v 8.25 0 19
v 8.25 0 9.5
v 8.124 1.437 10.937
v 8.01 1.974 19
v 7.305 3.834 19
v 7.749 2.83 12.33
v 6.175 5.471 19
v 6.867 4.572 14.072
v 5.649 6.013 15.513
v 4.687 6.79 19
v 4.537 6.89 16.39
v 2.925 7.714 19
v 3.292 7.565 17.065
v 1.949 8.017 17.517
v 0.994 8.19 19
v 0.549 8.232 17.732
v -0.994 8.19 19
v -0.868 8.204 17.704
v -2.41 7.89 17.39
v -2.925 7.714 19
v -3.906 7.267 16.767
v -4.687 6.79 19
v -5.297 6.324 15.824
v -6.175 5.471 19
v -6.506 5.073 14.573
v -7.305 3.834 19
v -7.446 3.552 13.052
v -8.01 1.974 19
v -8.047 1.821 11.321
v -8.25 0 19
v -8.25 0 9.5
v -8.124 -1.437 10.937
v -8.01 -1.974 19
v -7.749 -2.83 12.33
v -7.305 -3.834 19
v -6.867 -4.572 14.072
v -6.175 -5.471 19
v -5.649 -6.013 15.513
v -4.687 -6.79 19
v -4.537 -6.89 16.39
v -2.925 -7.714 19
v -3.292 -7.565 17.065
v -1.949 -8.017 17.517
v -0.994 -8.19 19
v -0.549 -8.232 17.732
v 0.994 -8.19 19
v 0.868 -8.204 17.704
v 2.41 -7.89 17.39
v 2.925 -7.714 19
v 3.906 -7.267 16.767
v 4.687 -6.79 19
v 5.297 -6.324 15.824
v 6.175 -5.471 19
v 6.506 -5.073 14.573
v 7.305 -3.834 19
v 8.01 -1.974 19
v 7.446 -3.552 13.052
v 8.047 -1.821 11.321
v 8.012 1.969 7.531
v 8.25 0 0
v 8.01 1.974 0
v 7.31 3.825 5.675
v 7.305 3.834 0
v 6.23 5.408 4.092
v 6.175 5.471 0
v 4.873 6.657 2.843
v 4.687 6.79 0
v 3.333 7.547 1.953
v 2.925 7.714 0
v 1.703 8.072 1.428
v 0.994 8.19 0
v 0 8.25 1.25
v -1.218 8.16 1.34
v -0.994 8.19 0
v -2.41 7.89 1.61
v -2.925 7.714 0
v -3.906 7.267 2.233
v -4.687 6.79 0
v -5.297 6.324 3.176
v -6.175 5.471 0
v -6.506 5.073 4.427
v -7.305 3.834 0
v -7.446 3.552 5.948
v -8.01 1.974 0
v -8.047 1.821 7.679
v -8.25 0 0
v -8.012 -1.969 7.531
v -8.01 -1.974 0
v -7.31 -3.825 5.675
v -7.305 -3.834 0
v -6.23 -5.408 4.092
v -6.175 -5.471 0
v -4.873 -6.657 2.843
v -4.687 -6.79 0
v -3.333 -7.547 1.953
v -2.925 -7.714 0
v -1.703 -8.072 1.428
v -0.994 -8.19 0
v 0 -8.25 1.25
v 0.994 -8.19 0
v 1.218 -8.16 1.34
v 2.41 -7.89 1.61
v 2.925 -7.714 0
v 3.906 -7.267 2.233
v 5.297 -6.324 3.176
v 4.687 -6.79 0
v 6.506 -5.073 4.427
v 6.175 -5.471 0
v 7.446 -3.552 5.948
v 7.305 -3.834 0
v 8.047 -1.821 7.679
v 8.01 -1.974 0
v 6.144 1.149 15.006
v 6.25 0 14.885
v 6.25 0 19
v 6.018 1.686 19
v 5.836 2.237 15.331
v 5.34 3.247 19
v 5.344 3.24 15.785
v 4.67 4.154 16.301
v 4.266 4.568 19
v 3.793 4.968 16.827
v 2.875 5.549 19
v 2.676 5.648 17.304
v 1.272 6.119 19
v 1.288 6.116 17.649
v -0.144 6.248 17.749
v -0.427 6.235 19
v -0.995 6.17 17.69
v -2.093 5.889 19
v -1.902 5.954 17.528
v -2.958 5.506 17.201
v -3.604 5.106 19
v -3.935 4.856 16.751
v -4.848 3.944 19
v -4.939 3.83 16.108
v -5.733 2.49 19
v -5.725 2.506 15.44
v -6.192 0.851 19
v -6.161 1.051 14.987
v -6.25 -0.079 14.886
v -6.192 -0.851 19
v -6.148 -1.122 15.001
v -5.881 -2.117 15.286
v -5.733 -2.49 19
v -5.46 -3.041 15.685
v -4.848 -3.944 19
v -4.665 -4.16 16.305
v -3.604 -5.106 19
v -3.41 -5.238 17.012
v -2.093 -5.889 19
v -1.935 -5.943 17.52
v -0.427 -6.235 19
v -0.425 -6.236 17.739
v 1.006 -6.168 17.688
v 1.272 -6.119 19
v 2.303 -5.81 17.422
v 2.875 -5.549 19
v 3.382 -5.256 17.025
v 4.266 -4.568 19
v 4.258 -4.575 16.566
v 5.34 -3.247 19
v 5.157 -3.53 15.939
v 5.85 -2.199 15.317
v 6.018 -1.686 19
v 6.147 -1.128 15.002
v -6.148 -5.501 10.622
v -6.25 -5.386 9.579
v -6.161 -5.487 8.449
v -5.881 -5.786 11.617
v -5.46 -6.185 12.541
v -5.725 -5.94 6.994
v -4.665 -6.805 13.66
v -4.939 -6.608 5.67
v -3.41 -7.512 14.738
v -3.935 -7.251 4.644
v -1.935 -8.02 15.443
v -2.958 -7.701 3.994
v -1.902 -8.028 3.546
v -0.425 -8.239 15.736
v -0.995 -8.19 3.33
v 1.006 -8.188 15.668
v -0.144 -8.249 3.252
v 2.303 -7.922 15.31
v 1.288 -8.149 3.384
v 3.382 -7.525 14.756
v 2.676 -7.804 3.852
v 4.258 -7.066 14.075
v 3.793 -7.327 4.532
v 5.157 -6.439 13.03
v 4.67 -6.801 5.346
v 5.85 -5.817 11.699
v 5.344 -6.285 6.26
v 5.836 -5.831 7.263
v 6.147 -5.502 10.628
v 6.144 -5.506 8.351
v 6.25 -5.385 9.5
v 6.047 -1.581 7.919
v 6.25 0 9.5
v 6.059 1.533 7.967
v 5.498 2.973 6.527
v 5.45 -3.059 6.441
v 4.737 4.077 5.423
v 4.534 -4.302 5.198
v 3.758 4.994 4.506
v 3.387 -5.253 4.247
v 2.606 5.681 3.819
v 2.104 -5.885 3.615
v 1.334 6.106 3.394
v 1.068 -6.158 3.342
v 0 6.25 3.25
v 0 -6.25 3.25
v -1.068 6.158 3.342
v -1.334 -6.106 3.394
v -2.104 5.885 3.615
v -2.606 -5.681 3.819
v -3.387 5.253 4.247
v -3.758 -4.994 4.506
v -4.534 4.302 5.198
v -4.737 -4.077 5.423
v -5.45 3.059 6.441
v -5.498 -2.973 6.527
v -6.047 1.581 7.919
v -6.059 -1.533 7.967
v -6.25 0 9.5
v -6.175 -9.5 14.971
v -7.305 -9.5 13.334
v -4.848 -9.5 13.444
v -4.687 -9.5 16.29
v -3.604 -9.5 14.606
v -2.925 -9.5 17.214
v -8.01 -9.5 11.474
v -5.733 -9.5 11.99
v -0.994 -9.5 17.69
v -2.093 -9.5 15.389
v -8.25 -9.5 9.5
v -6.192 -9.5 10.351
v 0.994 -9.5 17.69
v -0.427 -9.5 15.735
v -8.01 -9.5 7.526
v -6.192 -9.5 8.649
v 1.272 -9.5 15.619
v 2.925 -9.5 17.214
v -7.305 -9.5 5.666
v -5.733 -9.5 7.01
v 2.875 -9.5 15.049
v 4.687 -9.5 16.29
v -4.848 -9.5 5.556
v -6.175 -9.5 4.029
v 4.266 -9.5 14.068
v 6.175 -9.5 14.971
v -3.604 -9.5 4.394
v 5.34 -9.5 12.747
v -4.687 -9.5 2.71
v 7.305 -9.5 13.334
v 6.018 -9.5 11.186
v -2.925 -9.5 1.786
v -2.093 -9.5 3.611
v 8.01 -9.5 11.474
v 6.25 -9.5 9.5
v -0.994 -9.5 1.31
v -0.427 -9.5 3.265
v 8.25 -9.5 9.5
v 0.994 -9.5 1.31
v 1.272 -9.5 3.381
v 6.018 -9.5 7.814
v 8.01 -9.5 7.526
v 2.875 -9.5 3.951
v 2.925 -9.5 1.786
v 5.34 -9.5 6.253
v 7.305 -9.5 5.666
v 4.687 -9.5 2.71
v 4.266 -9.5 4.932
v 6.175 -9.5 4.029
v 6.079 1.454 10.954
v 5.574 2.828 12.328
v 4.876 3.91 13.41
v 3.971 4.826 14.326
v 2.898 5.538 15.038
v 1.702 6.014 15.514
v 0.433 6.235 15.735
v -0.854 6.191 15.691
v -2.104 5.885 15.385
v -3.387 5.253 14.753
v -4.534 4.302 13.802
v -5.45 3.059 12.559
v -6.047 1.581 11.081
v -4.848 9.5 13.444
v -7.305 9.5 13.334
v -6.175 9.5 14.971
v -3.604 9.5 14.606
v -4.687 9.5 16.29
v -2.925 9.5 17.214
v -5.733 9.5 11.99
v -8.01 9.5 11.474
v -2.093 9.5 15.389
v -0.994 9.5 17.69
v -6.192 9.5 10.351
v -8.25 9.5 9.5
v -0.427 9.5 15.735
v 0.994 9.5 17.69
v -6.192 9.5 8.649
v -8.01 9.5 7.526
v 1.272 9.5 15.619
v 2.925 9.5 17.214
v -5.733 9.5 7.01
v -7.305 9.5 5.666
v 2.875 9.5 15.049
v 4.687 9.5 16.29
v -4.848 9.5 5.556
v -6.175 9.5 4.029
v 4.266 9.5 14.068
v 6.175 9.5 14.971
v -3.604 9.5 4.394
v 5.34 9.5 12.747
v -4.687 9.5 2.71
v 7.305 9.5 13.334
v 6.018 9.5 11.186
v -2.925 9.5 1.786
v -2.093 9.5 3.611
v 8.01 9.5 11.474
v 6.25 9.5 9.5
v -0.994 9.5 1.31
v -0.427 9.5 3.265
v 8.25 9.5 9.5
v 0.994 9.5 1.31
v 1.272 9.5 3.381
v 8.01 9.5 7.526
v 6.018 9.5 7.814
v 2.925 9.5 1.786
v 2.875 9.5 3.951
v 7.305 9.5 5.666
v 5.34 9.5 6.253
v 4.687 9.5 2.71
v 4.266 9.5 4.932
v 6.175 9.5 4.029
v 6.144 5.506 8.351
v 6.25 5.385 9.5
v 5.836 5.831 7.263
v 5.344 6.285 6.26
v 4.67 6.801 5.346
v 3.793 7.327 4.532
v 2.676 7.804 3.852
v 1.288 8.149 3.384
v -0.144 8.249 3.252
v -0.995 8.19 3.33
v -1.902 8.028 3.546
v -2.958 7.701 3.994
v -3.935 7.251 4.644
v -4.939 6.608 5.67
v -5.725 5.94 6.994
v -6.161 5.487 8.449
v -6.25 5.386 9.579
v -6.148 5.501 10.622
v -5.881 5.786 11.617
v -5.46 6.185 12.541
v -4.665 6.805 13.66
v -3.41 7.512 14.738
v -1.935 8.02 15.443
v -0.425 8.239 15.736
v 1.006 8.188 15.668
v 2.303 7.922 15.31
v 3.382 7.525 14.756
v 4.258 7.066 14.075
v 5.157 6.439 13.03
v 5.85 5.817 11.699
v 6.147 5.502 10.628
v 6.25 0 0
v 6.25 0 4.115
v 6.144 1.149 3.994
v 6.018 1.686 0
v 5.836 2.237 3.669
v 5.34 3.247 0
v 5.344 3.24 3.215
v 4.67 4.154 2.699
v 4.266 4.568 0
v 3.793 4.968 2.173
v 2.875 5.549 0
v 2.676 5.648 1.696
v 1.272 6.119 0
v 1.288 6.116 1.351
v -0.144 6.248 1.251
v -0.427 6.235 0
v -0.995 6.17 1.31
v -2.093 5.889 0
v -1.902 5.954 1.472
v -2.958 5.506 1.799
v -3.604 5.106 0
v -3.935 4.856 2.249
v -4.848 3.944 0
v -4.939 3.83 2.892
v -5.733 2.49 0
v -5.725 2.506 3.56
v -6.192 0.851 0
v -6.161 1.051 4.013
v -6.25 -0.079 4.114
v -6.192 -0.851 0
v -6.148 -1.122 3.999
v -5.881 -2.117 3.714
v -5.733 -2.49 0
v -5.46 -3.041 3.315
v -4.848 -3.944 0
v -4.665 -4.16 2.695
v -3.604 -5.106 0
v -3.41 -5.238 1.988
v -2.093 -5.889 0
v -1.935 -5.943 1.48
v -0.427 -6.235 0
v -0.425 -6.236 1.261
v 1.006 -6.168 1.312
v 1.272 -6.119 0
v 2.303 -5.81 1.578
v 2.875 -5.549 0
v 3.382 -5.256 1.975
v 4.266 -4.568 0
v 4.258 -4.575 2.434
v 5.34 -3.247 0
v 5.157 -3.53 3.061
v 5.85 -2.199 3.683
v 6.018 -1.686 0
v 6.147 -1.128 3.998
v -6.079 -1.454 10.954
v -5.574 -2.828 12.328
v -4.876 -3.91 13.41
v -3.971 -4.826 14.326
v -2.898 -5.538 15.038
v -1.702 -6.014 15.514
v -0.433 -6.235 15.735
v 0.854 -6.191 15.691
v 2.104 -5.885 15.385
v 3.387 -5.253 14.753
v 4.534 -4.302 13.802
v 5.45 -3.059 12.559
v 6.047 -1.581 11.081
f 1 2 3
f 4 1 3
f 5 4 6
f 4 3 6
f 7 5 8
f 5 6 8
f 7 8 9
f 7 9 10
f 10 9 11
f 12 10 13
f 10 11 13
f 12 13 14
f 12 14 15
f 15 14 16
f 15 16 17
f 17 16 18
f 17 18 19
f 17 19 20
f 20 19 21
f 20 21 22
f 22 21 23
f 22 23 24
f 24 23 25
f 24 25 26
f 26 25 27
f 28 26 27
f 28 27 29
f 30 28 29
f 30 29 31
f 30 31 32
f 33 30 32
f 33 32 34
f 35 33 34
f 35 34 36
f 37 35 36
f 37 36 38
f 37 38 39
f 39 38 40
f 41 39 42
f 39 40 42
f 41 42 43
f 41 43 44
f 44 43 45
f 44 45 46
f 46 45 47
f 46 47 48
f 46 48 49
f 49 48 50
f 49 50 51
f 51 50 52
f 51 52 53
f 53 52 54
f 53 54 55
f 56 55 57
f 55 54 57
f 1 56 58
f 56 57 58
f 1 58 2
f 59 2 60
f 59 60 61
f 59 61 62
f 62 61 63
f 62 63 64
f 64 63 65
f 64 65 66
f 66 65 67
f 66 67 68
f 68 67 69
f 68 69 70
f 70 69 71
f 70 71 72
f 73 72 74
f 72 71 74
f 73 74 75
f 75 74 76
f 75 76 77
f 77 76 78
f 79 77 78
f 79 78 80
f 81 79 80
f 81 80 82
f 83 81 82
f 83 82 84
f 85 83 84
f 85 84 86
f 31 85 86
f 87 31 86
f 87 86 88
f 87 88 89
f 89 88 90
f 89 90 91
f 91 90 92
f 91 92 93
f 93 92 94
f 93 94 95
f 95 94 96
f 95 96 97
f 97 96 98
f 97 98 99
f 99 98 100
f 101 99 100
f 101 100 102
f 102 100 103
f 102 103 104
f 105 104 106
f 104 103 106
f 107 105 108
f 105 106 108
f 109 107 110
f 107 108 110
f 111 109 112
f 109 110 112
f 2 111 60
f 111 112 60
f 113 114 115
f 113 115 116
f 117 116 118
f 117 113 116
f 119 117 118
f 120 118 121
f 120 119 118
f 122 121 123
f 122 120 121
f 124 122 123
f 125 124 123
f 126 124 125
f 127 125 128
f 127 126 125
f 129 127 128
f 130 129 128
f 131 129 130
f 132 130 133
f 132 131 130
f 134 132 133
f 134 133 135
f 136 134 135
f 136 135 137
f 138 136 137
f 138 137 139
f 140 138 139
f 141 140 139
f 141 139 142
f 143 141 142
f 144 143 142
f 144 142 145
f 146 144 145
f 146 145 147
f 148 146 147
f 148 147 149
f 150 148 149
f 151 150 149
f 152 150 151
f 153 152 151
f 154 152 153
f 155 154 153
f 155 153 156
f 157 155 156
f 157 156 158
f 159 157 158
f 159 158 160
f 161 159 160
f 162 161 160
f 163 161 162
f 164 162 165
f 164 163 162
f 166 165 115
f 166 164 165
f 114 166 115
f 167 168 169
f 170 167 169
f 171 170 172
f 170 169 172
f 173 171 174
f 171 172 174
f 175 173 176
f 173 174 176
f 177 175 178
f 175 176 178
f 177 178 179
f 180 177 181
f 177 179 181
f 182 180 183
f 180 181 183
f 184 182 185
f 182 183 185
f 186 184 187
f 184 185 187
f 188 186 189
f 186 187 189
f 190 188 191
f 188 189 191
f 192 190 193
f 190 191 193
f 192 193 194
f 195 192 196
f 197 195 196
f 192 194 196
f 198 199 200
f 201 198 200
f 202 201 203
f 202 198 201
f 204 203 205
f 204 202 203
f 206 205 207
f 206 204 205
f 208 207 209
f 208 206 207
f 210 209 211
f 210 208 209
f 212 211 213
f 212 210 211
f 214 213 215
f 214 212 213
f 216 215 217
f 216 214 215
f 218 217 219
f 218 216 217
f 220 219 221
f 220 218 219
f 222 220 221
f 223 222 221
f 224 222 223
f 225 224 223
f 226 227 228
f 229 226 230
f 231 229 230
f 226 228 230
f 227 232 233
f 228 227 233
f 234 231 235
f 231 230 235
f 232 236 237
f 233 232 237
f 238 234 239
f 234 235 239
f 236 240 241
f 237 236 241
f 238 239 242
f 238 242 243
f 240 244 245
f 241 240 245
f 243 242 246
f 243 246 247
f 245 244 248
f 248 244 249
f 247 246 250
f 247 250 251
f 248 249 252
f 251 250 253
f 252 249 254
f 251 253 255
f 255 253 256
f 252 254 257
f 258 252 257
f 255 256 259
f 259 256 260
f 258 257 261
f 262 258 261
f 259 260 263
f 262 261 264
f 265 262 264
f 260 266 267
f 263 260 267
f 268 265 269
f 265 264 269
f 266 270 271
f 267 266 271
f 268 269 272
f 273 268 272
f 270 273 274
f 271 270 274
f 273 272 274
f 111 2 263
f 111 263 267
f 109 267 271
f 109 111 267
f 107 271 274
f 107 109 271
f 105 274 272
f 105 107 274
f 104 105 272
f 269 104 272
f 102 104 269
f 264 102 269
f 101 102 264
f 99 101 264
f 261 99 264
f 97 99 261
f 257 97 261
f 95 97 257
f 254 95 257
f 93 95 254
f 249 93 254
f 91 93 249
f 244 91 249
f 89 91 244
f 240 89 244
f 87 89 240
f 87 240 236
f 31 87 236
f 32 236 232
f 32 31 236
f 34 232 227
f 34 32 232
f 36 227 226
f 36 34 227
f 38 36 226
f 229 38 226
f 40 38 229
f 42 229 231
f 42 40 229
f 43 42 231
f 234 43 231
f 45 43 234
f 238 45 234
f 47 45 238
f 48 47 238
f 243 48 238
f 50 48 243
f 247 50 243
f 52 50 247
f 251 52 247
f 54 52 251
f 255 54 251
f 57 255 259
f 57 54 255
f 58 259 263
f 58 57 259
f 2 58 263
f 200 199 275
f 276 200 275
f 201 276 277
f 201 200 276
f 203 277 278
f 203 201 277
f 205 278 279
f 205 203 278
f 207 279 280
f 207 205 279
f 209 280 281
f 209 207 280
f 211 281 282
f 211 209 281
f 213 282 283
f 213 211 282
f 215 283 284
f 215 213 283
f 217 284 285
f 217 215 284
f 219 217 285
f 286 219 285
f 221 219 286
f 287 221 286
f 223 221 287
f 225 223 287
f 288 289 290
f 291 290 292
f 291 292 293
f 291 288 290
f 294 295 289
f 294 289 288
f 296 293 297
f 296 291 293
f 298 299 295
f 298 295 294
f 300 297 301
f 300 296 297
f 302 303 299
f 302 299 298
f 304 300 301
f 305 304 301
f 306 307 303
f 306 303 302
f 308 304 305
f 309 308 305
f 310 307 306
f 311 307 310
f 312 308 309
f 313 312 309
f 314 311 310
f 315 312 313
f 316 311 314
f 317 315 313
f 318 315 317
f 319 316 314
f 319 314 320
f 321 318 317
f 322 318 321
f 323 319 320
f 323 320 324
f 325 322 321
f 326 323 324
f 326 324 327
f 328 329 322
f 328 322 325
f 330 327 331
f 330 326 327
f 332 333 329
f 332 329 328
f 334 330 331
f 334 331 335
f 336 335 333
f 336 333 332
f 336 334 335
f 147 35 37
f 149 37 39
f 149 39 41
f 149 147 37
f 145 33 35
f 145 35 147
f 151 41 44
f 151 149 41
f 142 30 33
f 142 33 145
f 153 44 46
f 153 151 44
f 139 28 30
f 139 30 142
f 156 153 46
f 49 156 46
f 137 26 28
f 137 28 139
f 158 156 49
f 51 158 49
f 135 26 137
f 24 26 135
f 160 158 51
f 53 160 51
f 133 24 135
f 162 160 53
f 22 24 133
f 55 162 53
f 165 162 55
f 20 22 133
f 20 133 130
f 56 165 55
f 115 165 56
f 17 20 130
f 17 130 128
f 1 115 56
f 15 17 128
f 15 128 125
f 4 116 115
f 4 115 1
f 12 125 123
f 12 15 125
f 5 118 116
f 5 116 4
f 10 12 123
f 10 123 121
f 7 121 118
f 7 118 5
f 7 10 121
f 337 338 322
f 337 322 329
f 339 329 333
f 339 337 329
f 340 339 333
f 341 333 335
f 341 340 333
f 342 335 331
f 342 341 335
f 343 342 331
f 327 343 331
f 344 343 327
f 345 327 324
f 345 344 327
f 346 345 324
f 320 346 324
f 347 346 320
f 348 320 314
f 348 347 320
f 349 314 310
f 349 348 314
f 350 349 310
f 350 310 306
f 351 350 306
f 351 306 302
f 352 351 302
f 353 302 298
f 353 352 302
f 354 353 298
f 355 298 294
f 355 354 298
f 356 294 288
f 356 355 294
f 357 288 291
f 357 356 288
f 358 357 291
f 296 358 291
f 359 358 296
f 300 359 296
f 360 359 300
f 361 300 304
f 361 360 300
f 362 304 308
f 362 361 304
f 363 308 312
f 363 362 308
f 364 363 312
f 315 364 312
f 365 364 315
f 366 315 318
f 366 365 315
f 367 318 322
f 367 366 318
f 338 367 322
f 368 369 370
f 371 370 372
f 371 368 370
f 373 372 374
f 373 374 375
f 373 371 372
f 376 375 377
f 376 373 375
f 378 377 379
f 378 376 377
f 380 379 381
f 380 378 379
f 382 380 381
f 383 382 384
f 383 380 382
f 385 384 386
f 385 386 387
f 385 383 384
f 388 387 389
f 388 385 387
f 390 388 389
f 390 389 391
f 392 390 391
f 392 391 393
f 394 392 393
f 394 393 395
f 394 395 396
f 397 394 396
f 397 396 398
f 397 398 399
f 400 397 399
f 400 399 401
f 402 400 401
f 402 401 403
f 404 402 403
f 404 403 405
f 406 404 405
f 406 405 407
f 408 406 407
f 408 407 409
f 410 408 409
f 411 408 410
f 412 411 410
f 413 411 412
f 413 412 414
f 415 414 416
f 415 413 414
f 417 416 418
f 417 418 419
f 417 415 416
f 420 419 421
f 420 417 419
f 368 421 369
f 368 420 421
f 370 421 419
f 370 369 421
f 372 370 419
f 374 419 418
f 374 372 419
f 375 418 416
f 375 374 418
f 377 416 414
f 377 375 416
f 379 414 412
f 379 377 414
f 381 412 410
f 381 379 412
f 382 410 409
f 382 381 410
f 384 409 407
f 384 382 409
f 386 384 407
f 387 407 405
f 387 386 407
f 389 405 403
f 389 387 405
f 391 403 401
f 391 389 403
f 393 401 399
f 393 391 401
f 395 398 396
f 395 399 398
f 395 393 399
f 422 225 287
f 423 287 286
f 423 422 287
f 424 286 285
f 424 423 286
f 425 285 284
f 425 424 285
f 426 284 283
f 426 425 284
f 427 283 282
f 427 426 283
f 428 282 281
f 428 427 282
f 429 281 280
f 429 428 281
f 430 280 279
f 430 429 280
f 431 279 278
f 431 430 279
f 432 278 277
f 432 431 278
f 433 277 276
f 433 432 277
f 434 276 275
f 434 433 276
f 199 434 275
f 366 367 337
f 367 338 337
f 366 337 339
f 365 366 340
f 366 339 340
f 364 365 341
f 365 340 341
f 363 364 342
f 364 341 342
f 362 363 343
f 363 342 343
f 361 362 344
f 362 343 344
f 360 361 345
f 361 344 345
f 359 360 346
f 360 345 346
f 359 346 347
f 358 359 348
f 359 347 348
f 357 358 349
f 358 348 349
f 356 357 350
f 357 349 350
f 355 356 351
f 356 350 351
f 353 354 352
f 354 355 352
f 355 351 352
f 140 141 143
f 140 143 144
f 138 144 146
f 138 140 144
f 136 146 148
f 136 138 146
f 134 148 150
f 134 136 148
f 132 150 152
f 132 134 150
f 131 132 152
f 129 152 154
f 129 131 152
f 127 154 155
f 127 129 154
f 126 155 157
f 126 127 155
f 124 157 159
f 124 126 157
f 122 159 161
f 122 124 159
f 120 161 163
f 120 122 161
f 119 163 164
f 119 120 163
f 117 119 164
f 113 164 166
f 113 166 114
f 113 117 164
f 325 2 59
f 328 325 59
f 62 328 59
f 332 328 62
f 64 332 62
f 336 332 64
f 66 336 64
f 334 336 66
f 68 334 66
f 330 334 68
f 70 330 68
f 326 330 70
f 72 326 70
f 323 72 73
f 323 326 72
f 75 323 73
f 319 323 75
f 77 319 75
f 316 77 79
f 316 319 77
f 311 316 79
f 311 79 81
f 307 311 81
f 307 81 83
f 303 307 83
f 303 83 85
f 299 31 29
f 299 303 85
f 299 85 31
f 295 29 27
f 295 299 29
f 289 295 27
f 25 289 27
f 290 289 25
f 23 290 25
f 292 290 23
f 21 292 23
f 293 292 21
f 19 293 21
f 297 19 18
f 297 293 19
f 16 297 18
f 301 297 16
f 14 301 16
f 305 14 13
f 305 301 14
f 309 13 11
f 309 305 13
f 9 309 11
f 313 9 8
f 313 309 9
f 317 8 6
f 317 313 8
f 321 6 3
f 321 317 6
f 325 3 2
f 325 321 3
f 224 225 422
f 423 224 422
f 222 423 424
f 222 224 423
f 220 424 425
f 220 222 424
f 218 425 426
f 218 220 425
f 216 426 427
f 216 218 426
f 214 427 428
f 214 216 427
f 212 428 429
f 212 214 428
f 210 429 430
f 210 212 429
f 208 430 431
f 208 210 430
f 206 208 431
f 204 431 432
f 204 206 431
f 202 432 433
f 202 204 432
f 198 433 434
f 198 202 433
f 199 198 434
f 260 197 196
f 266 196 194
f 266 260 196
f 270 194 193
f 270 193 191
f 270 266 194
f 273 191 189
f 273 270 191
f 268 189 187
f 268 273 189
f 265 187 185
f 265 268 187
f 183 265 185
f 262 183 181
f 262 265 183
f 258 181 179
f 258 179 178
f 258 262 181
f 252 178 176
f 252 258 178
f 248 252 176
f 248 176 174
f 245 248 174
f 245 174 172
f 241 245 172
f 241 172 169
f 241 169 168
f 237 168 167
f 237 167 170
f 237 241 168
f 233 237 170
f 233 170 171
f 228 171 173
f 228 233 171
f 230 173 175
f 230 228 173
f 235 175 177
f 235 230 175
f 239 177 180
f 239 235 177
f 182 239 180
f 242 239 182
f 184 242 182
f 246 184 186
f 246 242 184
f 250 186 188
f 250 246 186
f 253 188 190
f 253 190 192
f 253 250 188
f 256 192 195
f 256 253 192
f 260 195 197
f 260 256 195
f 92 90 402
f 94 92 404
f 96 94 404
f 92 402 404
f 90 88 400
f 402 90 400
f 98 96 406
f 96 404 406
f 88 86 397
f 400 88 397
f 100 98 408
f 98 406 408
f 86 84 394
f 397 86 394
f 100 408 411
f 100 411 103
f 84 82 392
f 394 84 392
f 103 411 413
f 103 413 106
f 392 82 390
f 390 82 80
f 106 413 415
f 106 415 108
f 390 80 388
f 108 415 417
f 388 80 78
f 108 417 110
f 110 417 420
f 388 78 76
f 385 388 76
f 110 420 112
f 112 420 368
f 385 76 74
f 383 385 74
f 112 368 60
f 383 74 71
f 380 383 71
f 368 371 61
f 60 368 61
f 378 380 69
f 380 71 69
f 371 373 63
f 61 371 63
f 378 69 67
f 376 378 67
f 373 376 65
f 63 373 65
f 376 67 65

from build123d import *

# Parameters (mm, degrees)
SKETCH2_R           = 8.25
SKETCH2_R_2         = 6.25
EXTRUDE_THIN1_DEPTH = 19
SKETCH4_R           = 8.25
SKETCH4_R_2         = 6.25
EXTRUDE_THIN2_DEPTH = 9.5


with BuildPart() as part:
    # Sketch2 → Extrude-Thin1 (new body)
    with BuildSketch(Plane.XY):
        Circle(SKETCH2_R)
        Circle(SKETCH2_R_2, mode=Mode.SUBTRACT)
    extrude(amount=EXTRUDE_THIN1_DEPTH)

    # Sketch4 → Extrude-Thin2 (add, symmetric)
    with BuildSketch(Plane(origin=(0, 0, 0), x_dir=(1, 0, 0), z_dir=(0, 1, 0))):
        with Locations((0, -9.5)):
            Circle(SKETCH4_R)
        with Locations((0, -9.5)):
            Circle(SKETCH4_R_2, mode=Mode.SUBTRACT)
    extrude(amount=EXTRUDE_THIN2_DEPTH, both=True)


solid = part.part
